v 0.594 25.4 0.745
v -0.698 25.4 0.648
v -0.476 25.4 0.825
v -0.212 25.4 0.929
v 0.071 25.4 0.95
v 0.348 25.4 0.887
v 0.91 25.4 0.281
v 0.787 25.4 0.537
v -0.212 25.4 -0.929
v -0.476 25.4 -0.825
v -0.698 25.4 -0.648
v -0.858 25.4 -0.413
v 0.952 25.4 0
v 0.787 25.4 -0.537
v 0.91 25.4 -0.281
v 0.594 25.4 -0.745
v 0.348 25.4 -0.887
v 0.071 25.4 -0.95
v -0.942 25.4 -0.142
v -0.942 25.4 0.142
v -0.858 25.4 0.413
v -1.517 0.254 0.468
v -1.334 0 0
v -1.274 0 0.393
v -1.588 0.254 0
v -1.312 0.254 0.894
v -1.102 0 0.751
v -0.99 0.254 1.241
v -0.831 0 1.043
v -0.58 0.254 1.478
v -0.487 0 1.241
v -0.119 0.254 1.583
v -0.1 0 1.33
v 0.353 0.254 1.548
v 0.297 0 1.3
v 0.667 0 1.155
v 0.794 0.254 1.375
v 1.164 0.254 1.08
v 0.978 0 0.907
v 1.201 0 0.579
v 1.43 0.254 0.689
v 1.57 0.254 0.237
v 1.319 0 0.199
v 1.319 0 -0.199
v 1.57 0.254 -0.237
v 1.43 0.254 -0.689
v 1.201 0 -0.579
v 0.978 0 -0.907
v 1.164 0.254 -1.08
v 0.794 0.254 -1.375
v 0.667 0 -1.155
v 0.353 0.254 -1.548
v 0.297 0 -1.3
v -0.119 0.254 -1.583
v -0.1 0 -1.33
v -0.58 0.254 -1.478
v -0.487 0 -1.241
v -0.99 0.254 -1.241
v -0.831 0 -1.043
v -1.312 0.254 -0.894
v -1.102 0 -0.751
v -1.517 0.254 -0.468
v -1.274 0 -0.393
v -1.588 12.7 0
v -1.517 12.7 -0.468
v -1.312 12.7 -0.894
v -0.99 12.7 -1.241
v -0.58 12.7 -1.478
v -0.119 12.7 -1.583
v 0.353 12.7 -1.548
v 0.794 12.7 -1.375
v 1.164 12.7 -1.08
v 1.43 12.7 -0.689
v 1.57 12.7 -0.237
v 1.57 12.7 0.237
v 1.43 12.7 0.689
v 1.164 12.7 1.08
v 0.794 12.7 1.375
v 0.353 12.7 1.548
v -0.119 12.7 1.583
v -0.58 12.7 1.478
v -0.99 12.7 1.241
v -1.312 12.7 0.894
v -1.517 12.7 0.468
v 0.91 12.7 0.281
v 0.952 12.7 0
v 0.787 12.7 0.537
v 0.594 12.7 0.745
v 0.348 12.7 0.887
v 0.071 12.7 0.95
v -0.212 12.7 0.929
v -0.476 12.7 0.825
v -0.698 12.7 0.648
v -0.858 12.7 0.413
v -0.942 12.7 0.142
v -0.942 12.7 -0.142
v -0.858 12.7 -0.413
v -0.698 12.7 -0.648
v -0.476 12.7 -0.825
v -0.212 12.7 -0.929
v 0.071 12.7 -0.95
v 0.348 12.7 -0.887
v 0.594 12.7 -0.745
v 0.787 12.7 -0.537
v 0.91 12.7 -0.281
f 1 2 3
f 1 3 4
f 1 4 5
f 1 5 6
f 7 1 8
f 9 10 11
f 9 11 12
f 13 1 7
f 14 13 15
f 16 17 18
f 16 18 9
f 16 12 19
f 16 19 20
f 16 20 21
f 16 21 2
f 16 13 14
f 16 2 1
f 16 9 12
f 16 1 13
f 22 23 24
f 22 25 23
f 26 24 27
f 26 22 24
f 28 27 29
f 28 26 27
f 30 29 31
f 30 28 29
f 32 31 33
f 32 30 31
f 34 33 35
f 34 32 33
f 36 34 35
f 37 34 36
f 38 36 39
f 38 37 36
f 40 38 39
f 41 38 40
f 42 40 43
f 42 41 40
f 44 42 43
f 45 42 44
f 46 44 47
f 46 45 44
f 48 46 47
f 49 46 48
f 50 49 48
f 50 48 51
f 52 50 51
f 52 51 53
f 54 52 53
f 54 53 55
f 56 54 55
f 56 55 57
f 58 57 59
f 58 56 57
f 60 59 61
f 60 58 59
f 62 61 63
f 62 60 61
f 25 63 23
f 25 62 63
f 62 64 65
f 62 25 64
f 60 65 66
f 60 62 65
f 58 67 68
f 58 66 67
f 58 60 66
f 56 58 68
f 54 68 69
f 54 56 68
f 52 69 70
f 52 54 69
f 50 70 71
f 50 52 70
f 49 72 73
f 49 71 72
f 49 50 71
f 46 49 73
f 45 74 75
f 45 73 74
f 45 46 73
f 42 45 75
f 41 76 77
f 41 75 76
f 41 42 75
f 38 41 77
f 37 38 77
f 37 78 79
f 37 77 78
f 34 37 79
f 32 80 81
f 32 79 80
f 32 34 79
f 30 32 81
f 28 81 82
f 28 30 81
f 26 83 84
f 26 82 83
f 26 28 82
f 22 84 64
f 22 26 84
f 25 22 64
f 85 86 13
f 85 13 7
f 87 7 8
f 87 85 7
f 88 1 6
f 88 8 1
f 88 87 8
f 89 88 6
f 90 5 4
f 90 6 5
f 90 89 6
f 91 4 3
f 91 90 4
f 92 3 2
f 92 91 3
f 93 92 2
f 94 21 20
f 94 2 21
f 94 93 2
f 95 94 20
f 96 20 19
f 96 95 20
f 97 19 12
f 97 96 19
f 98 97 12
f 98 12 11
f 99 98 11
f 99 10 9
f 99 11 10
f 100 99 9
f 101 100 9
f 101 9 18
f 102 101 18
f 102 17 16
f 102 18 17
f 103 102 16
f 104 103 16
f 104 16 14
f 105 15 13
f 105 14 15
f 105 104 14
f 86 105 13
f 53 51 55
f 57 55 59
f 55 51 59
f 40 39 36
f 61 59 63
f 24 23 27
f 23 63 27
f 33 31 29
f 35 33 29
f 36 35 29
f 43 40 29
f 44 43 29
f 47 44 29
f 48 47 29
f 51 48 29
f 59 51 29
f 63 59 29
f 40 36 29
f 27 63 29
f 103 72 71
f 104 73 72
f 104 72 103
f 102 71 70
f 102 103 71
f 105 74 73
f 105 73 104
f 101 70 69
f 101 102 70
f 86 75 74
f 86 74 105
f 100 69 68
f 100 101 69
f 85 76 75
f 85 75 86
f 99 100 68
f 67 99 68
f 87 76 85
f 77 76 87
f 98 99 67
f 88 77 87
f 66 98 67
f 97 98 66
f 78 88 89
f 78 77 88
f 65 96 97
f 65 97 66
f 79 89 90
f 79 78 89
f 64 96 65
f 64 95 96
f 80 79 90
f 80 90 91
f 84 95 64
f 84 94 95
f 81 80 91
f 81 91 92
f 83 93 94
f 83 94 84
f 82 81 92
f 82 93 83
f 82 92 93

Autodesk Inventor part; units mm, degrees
ref_plane "YZ Plane" through (0, 0, 0) normal (1, 0, 0) x (0, 1, 0)
ref_plane "XZ Plane" through (0, 0, 0) normal (0, 1, 0) x (-1, 0, 0)
ref_plane "XY Plane" through (0, 0, 0) normal (0, 0, 1) x (1, 0, 0)
sketch "Sketch1" plane through (0, 0, 0) normal (0, 1, 0) x (-1, 0, 0)
  circle A0 centre (0, 0) radius 1.5875
  dimension "d0" = 3.175
extrude "Extrusion1" add sketch "Sketch1" along normal blind 12.7
thread "Thread1" size "5-40 UNC" class "2A" standard "ANSI Unified Screw Threads" length 12.7
chamfer "Chamfer1" distance 0.254 angle 45 1 edges at (1.5875, 0, 0)
sketch "Sketch3" plane through (0, 12.7, 0) normal (0, 1, 0) x (1, 0, 0)
  circle A0 centre (0, 0) radius 0.9525
  dimension "d11" = 1.905
extrude "Extrusion3" add sketch "Sketch3" along normal blind 12.7
properties part number "burner rodx3 part 1" material "Stainless Steel"
